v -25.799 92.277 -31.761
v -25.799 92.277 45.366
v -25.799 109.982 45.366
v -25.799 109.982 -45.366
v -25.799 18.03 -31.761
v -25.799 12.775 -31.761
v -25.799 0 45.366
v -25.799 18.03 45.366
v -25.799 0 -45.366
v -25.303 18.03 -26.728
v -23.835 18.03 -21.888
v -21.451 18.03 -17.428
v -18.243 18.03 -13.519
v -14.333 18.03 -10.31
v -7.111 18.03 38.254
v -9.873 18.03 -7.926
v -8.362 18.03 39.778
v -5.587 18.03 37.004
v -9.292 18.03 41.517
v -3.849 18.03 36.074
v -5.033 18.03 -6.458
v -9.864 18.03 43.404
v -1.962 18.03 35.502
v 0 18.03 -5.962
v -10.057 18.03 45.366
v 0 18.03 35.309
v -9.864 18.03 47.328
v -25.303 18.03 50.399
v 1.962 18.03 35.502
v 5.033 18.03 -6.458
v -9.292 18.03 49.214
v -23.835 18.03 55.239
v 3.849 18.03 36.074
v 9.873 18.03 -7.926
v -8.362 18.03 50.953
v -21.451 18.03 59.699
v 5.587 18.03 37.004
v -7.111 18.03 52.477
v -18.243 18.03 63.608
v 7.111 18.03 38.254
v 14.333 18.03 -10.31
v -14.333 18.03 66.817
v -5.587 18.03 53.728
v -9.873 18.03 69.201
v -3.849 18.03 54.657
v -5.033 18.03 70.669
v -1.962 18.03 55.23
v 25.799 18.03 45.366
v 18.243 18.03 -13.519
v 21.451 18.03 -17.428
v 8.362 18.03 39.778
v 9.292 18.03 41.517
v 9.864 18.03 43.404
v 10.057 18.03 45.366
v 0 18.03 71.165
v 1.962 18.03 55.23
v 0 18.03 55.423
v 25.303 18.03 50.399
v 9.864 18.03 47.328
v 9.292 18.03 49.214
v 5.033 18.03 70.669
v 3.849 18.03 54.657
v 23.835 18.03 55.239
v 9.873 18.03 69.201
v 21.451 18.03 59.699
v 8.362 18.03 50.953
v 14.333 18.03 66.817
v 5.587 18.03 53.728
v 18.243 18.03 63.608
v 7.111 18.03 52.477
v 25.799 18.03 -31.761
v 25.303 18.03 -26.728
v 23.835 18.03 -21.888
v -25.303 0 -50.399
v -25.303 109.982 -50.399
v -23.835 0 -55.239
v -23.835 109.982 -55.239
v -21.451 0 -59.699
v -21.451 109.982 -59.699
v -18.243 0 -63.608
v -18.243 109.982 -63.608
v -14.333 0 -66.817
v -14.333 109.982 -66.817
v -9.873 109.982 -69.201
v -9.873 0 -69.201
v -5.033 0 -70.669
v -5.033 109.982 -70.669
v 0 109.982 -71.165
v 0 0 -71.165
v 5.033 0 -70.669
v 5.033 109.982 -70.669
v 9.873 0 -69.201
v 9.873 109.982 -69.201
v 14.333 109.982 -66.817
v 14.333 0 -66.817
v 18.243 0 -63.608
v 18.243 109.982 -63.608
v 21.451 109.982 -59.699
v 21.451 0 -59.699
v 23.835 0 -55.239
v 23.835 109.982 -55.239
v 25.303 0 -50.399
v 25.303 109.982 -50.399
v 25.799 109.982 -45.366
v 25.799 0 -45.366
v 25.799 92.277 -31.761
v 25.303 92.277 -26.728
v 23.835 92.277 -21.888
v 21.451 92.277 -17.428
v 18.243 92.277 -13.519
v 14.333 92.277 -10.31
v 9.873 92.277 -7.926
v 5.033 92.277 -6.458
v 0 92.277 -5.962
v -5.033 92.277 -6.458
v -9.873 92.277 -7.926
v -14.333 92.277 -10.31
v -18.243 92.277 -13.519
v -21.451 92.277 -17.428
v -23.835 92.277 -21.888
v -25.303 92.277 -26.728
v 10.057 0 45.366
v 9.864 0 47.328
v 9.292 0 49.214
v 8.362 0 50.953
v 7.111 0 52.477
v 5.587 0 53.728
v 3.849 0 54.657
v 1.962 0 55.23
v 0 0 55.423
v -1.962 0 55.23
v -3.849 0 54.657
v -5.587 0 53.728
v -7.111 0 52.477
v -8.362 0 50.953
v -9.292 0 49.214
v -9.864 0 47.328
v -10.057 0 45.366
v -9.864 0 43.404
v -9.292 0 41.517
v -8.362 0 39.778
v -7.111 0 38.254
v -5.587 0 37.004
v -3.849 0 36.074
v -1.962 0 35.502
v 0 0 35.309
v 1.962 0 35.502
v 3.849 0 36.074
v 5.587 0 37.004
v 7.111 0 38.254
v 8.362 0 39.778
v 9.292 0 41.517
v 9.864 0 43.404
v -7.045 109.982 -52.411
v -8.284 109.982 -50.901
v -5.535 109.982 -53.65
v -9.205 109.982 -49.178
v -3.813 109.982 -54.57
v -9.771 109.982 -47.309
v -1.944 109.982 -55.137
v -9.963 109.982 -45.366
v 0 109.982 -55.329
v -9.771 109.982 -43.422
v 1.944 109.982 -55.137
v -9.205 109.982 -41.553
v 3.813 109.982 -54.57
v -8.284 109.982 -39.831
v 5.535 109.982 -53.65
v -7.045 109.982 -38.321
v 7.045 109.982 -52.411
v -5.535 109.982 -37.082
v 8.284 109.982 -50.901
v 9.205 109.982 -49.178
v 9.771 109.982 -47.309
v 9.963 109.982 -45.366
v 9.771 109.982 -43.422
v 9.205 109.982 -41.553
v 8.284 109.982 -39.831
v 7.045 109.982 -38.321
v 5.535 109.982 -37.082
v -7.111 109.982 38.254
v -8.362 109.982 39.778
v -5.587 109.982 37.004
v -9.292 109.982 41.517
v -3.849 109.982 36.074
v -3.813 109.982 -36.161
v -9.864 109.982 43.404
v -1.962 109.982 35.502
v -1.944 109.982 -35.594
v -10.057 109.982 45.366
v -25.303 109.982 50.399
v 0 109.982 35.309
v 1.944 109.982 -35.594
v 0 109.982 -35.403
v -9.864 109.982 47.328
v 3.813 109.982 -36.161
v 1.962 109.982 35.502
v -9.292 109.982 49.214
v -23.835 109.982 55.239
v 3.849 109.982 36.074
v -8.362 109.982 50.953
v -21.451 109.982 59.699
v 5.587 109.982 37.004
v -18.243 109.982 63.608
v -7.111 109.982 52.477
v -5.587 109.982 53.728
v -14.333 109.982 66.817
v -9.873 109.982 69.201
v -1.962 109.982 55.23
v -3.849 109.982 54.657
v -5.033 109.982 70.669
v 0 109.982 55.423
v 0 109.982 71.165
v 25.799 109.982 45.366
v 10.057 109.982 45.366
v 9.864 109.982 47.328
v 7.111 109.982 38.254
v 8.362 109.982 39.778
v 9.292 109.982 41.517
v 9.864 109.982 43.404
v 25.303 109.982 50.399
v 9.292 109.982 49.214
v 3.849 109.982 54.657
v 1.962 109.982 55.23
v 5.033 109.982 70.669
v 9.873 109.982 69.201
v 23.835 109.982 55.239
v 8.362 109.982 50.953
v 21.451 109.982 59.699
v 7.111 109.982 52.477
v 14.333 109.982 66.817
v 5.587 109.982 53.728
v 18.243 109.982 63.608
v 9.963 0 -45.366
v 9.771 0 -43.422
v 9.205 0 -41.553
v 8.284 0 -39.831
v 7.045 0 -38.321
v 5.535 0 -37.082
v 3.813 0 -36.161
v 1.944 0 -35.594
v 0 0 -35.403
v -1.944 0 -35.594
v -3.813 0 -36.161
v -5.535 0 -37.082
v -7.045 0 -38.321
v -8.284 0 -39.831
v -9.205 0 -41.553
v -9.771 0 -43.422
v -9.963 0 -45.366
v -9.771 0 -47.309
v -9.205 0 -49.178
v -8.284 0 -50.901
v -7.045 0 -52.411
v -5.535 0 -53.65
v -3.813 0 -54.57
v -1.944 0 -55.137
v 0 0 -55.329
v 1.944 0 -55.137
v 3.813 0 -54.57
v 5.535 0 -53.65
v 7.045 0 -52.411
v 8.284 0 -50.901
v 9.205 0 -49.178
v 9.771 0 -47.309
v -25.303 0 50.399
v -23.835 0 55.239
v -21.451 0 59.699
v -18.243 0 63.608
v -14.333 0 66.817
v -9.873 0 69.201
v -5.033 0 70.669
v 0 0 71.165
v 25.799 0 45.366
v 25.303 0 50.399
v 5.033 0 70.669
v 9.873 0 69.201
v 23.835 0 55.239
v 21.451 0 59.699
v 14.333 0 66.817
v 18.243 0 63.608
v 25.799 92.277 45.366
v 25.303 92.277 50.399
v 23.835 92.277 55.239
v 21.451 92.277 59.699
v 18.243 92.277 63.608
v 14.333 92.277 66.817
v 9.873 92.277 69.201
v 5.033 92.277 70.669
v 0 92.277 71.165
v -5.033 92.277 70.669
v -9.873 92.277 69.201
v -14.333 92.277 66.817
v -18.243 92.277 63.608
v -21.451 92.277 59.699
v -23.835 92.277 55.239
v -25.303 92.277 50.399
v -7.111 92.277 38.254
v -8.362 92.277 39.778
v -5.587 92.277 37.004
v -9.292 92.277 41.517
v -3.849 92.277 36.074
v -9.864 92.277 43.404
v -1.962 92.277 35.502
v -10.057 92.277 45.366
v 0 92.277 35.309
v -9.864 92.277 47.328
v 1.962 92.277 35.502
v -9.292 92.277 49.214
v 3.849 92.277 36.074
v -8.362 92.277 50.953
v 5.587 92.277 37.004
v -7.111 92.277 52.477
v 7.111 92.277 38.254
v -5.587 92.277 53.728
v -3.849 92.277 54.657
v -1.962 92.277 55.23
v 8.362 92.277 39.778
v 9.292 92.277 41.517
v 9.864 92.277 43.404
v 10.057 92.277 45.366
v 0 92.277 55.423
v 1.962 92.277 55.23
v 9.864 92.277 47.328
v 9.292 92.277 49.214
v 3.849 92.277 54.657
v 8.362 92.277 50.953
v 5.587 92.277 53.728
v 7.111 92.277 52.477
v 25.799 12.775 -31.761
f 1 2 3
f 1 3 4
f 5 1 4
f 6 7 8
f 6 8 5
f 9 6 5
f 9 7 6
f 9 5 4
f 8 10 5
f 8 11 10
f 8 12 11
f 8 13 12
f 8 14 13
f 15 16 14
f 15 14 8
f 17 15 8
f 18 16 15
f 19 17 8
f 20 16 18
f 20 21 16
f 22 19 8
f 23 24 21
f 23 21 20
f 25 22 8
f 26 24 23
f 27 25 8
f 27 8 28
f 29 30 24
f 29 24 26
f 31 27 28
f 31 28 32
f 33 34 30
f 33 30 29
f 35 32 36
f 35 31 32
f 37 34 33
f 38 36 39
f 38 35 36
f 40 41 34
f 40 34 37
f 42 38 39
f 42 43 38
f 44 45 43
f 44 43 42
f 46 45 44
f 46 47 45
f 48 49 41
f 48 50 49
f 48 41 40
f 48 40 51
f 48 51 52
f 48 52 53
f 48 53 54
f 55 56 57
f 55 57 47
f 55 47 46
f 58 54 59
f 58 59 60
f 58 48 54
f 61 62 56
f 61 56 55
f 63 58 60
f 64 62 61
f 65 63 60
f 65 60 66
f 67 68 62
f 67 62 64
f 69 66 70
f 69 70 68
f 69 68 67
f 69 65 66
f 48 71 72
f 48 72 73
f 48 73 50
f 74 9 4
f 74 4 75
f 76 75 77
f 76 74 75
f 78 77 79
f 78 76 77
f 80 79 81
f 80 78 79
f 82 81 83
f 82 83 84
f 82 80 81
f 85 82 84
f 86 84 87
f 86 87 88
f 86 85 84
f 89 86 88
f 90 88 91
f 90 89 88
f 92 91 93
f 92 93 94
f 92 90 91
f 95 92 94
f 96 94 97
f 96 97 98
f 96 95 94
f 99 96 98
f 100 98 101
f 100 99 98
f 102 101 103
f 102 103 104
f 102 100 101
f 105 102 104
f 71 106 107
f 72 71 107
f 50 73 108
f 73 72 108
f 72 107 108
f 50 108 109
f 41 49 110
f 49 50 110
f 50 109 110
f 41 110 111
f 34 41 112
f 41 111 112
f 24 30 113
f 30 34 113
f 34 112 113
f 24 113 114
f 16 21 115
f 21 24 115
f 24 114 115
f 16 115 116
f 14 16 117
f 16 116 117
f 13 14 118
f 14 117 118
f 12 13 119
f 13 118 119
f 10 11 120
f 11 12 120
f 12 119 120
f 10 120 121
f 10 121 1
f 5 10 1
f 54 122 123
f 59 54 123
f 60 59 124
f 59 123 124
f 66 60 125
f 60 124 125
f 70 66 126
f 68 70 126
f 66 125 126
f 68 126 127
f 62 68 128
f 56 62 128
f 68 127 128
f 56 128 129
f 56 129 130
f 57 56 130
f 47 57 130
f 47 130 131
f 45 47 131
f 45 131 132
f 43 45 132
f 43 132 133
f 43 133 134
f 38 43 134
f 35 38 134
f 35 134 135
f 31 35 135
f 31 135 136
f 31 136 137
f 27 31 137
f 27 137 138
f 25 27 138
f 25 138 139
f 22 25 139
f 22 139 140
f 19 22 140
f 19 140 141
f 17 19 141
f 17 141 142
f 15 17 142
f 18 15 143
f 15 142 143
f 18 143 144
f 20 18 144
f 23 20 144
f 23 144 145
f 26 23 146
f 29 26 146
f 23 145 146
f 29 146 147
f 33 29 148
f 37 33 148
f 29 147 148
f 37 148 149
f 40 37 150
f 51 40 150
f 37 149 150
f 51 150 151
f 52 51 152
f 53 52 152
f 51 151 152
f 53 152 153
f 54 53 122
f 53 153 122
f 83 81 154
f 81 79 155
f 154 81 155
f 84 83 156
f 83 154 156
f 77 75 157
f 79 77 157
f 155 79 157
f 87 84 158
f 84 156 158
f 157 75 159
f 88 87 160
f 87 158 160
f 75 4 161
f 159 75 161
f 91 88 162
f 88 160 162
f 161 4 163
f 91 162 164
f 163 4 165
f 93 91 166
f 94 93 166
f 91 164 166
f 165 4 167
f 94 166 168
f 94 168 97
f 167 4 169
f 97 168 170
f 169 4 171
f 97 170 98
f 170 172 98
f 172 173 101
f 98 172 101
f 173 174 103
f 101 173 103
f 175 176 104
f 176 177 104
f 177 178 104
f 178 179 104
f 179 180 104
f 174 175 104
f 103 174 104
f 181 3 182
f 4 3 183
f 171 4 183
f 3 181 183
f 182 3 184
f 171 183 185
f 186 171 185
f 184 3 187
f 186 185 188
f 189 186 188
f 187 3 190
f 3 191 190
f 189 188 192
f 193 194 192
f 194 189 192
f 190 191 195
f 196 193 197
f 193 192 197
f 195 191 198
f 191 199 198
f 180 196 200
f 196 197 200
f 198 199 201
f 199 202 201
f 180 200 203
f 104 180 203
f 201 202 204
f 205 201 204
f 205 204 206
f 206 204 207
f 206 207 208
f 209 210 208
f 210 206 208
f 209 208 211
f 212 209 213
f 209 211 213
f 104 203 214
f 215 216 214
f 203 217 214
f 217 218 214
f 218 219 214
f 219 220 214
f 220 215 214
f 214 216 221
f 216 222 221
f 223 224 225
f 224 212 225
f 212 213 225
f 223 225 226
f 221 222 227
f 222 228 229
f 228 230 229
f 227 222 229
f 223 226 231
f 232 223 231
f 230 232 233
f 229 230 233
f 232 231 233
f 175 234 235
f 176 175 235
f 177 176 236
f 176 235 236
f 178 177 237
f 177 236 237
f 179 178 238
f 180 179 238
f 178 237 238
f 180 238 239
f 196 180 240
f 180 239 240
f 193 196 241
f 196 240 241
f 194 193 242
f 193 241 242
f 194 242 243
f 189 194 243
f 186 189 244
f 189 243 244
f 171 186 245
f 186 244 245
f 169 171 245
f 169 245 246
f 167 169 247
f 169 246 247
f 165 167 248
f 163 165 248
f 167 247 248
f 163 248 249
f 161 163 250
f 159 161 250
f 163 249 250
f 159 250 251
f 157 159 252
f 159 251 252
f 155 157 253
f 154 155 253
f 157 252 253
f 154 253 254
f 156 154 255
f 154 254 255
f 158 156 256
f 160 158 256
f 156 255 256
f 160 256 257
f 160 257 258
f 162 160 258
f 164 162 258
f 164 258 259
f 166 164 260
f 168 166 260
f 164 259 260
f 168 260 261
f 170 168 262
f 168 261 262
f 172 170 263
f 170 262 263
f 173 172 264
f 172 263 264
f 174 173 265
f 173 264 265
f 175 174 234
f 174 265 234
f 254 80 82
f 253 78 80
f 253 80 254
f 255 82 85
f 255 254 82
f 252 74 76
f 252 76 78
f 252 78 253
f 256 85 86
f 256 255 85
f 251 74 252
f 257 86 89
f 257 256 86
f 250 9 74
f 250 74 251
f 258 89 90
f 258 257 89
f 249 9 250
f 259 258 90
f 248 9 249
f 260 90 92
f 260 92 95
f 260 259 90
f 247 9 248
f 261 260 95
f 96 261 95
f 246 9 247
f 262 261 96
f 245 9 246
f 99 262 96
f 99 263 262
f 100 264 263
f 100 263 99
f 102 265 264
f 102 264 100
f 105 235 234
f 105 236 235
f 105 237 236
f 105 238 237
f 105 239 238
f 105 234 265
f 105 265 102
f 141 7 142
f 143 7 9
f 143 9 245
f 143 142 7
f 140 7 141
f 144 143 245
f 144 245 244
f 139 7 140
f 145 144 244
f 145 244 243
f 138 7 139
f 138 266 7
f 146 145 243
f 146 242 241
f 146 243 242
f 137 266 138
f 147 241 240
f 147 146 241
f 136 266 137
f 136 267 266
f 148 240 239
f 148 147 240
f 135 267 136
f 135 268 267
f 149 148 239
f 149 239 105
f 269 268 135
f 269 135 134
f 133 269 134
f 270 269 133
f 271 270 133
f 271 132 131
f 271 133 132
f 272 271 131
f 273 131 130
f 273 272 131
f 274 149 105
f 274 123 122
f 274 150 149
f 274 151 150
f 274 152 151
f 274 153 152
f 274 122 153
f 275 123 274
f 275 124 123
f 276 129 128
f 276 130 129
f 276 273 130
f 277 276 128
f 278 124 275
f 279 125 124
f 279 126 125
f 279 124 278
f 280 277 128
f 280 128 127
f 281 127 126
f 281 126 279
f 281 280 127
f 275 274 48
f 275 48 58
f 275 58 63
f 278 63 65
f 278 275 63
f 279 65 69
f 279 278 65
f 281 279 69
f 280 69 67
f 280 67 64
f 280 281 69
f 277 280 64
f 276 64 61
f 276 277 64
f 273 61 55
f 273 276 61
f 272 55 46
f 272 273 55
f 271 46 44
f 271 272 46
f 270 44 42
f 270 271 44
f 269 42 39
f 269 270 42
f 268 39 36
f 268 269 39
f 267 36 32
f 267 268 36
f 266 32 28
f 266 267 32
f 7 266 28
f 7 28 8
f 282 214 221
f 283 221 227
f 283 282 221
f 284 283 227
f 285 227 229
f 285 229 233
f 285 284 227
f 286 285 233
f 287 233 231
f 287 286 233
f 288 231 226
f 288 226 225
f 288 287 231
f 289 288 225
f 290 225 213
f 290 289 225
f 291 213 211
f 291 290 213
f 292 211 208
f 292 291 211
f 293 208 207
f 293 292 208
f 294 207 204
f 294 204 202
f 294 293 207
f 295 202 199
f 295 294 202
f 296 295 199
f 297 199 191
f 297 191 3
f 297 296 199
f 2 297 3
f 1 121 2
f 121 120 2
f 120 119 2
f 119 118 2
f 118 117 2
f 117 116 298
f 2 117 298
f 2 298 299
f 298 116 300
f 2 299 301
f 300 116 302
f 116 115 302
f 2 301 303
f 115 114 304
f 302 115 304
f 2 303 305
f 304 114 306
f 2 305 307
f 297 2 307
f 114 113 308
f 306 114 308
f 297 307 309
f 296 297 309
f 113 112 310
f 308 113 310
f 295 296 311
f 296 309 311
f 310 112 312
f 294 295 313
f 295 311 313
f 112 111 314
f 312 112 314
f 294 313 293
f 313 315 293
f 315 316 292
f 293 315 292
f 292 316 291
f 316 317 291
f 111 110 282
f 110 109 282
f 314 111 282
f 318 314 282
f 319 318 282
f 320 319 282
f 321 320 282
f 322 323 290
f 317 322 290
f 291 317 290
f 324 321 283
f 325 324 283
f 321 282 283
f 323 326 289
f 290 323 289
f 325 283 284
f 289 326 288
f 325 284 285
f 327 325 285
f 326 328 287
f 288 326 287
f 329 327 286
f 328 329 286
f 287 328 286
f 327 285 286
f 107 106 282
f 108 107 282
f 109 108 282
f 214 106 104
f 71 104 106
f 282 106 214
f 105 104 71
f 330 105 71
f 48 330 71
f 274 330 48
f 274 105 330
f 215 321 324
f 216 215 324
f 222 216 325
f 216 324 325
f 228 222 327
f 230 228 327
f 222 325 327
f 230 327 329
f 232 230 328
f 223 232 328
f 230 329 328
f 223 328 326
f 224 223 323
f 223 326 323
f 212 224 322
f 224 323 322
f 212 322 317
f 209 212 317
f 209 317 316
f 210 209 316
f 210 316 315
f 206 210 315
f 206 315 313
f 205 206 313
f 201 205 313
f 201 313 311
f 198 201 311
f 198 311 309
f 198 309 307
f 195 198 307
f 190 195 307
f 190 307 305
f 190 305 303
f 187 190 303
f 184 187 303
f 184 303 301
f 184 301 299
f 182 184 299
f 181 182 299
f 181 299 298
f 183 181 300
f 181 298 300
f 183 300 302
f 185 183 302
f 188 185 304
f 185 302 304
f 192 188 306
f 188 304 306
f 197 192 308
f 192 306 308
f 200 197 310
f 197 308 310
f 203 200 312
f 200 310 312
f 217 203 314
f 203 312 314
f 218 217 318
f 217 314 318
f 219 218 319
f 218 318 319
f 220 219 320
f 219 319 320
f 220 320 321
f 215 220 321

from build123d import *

# Parameters (mm, degrees)
F0_R     = 9.962887
F0_R_2   = 10.057091
F1_DEPTH = 109.982
F2_W     = 74.247135
F2_H     = 110.230008
F3_DEPTH = 51.598741
F5_DEPTH = 79.502


with BuildPart() as f1:
    # F0 (on Front) → F1 (new body)
    with BuildSketch(Plane.XZ):
        with BuildLine():
            ThreePointArc((-25.79887, -45.365807), (0, -71.164677), (25.79887, -45.365807))
            Line((25.79887, -45.365807), (25.79887, 45.365807))
            ThreePointArc((25.79887, 45.365807), (0, 71.164677), (-25.79887, 45.365807))
            Line((-25.79887, 45.365807), (-25.79887, -45.365807))
        make_face()
        with Locations((0, -45.365807)):
            Circle(F0_R, mode=Mode.SUBTRACT)
        with Locations((0, 45.365807)):
            Circle(F0_R_2, mode=Mode.SUBTRACT)
    extrude(amount=-F1_DEPTH)

    # F2 (on face) → F3 (cut, through all)
    with BuildSketch(Plane.YZ.offset(25.79887)):
        with Locations((55.153735, 23.353766)):
            Rectangle(F2_W, F2_H)
    extrude(amount=-F3_DEPTH, mode=Mode.SUBTRACT)

    # F4 (on face) → F5 (join)
    with BuildSketch(Plane.XZ.offset(-92.277303)):
        with BuildLine():
            Line((-25.79887, -31.761238), (25.79887, -31.761238))
            ThreePointArc((25.79887, -31.761238), (0, -5.962368), (-25.79887, -31.761238))
        make_face()
    extrude(amount=F5_DEPTH)


solid = f1.part
